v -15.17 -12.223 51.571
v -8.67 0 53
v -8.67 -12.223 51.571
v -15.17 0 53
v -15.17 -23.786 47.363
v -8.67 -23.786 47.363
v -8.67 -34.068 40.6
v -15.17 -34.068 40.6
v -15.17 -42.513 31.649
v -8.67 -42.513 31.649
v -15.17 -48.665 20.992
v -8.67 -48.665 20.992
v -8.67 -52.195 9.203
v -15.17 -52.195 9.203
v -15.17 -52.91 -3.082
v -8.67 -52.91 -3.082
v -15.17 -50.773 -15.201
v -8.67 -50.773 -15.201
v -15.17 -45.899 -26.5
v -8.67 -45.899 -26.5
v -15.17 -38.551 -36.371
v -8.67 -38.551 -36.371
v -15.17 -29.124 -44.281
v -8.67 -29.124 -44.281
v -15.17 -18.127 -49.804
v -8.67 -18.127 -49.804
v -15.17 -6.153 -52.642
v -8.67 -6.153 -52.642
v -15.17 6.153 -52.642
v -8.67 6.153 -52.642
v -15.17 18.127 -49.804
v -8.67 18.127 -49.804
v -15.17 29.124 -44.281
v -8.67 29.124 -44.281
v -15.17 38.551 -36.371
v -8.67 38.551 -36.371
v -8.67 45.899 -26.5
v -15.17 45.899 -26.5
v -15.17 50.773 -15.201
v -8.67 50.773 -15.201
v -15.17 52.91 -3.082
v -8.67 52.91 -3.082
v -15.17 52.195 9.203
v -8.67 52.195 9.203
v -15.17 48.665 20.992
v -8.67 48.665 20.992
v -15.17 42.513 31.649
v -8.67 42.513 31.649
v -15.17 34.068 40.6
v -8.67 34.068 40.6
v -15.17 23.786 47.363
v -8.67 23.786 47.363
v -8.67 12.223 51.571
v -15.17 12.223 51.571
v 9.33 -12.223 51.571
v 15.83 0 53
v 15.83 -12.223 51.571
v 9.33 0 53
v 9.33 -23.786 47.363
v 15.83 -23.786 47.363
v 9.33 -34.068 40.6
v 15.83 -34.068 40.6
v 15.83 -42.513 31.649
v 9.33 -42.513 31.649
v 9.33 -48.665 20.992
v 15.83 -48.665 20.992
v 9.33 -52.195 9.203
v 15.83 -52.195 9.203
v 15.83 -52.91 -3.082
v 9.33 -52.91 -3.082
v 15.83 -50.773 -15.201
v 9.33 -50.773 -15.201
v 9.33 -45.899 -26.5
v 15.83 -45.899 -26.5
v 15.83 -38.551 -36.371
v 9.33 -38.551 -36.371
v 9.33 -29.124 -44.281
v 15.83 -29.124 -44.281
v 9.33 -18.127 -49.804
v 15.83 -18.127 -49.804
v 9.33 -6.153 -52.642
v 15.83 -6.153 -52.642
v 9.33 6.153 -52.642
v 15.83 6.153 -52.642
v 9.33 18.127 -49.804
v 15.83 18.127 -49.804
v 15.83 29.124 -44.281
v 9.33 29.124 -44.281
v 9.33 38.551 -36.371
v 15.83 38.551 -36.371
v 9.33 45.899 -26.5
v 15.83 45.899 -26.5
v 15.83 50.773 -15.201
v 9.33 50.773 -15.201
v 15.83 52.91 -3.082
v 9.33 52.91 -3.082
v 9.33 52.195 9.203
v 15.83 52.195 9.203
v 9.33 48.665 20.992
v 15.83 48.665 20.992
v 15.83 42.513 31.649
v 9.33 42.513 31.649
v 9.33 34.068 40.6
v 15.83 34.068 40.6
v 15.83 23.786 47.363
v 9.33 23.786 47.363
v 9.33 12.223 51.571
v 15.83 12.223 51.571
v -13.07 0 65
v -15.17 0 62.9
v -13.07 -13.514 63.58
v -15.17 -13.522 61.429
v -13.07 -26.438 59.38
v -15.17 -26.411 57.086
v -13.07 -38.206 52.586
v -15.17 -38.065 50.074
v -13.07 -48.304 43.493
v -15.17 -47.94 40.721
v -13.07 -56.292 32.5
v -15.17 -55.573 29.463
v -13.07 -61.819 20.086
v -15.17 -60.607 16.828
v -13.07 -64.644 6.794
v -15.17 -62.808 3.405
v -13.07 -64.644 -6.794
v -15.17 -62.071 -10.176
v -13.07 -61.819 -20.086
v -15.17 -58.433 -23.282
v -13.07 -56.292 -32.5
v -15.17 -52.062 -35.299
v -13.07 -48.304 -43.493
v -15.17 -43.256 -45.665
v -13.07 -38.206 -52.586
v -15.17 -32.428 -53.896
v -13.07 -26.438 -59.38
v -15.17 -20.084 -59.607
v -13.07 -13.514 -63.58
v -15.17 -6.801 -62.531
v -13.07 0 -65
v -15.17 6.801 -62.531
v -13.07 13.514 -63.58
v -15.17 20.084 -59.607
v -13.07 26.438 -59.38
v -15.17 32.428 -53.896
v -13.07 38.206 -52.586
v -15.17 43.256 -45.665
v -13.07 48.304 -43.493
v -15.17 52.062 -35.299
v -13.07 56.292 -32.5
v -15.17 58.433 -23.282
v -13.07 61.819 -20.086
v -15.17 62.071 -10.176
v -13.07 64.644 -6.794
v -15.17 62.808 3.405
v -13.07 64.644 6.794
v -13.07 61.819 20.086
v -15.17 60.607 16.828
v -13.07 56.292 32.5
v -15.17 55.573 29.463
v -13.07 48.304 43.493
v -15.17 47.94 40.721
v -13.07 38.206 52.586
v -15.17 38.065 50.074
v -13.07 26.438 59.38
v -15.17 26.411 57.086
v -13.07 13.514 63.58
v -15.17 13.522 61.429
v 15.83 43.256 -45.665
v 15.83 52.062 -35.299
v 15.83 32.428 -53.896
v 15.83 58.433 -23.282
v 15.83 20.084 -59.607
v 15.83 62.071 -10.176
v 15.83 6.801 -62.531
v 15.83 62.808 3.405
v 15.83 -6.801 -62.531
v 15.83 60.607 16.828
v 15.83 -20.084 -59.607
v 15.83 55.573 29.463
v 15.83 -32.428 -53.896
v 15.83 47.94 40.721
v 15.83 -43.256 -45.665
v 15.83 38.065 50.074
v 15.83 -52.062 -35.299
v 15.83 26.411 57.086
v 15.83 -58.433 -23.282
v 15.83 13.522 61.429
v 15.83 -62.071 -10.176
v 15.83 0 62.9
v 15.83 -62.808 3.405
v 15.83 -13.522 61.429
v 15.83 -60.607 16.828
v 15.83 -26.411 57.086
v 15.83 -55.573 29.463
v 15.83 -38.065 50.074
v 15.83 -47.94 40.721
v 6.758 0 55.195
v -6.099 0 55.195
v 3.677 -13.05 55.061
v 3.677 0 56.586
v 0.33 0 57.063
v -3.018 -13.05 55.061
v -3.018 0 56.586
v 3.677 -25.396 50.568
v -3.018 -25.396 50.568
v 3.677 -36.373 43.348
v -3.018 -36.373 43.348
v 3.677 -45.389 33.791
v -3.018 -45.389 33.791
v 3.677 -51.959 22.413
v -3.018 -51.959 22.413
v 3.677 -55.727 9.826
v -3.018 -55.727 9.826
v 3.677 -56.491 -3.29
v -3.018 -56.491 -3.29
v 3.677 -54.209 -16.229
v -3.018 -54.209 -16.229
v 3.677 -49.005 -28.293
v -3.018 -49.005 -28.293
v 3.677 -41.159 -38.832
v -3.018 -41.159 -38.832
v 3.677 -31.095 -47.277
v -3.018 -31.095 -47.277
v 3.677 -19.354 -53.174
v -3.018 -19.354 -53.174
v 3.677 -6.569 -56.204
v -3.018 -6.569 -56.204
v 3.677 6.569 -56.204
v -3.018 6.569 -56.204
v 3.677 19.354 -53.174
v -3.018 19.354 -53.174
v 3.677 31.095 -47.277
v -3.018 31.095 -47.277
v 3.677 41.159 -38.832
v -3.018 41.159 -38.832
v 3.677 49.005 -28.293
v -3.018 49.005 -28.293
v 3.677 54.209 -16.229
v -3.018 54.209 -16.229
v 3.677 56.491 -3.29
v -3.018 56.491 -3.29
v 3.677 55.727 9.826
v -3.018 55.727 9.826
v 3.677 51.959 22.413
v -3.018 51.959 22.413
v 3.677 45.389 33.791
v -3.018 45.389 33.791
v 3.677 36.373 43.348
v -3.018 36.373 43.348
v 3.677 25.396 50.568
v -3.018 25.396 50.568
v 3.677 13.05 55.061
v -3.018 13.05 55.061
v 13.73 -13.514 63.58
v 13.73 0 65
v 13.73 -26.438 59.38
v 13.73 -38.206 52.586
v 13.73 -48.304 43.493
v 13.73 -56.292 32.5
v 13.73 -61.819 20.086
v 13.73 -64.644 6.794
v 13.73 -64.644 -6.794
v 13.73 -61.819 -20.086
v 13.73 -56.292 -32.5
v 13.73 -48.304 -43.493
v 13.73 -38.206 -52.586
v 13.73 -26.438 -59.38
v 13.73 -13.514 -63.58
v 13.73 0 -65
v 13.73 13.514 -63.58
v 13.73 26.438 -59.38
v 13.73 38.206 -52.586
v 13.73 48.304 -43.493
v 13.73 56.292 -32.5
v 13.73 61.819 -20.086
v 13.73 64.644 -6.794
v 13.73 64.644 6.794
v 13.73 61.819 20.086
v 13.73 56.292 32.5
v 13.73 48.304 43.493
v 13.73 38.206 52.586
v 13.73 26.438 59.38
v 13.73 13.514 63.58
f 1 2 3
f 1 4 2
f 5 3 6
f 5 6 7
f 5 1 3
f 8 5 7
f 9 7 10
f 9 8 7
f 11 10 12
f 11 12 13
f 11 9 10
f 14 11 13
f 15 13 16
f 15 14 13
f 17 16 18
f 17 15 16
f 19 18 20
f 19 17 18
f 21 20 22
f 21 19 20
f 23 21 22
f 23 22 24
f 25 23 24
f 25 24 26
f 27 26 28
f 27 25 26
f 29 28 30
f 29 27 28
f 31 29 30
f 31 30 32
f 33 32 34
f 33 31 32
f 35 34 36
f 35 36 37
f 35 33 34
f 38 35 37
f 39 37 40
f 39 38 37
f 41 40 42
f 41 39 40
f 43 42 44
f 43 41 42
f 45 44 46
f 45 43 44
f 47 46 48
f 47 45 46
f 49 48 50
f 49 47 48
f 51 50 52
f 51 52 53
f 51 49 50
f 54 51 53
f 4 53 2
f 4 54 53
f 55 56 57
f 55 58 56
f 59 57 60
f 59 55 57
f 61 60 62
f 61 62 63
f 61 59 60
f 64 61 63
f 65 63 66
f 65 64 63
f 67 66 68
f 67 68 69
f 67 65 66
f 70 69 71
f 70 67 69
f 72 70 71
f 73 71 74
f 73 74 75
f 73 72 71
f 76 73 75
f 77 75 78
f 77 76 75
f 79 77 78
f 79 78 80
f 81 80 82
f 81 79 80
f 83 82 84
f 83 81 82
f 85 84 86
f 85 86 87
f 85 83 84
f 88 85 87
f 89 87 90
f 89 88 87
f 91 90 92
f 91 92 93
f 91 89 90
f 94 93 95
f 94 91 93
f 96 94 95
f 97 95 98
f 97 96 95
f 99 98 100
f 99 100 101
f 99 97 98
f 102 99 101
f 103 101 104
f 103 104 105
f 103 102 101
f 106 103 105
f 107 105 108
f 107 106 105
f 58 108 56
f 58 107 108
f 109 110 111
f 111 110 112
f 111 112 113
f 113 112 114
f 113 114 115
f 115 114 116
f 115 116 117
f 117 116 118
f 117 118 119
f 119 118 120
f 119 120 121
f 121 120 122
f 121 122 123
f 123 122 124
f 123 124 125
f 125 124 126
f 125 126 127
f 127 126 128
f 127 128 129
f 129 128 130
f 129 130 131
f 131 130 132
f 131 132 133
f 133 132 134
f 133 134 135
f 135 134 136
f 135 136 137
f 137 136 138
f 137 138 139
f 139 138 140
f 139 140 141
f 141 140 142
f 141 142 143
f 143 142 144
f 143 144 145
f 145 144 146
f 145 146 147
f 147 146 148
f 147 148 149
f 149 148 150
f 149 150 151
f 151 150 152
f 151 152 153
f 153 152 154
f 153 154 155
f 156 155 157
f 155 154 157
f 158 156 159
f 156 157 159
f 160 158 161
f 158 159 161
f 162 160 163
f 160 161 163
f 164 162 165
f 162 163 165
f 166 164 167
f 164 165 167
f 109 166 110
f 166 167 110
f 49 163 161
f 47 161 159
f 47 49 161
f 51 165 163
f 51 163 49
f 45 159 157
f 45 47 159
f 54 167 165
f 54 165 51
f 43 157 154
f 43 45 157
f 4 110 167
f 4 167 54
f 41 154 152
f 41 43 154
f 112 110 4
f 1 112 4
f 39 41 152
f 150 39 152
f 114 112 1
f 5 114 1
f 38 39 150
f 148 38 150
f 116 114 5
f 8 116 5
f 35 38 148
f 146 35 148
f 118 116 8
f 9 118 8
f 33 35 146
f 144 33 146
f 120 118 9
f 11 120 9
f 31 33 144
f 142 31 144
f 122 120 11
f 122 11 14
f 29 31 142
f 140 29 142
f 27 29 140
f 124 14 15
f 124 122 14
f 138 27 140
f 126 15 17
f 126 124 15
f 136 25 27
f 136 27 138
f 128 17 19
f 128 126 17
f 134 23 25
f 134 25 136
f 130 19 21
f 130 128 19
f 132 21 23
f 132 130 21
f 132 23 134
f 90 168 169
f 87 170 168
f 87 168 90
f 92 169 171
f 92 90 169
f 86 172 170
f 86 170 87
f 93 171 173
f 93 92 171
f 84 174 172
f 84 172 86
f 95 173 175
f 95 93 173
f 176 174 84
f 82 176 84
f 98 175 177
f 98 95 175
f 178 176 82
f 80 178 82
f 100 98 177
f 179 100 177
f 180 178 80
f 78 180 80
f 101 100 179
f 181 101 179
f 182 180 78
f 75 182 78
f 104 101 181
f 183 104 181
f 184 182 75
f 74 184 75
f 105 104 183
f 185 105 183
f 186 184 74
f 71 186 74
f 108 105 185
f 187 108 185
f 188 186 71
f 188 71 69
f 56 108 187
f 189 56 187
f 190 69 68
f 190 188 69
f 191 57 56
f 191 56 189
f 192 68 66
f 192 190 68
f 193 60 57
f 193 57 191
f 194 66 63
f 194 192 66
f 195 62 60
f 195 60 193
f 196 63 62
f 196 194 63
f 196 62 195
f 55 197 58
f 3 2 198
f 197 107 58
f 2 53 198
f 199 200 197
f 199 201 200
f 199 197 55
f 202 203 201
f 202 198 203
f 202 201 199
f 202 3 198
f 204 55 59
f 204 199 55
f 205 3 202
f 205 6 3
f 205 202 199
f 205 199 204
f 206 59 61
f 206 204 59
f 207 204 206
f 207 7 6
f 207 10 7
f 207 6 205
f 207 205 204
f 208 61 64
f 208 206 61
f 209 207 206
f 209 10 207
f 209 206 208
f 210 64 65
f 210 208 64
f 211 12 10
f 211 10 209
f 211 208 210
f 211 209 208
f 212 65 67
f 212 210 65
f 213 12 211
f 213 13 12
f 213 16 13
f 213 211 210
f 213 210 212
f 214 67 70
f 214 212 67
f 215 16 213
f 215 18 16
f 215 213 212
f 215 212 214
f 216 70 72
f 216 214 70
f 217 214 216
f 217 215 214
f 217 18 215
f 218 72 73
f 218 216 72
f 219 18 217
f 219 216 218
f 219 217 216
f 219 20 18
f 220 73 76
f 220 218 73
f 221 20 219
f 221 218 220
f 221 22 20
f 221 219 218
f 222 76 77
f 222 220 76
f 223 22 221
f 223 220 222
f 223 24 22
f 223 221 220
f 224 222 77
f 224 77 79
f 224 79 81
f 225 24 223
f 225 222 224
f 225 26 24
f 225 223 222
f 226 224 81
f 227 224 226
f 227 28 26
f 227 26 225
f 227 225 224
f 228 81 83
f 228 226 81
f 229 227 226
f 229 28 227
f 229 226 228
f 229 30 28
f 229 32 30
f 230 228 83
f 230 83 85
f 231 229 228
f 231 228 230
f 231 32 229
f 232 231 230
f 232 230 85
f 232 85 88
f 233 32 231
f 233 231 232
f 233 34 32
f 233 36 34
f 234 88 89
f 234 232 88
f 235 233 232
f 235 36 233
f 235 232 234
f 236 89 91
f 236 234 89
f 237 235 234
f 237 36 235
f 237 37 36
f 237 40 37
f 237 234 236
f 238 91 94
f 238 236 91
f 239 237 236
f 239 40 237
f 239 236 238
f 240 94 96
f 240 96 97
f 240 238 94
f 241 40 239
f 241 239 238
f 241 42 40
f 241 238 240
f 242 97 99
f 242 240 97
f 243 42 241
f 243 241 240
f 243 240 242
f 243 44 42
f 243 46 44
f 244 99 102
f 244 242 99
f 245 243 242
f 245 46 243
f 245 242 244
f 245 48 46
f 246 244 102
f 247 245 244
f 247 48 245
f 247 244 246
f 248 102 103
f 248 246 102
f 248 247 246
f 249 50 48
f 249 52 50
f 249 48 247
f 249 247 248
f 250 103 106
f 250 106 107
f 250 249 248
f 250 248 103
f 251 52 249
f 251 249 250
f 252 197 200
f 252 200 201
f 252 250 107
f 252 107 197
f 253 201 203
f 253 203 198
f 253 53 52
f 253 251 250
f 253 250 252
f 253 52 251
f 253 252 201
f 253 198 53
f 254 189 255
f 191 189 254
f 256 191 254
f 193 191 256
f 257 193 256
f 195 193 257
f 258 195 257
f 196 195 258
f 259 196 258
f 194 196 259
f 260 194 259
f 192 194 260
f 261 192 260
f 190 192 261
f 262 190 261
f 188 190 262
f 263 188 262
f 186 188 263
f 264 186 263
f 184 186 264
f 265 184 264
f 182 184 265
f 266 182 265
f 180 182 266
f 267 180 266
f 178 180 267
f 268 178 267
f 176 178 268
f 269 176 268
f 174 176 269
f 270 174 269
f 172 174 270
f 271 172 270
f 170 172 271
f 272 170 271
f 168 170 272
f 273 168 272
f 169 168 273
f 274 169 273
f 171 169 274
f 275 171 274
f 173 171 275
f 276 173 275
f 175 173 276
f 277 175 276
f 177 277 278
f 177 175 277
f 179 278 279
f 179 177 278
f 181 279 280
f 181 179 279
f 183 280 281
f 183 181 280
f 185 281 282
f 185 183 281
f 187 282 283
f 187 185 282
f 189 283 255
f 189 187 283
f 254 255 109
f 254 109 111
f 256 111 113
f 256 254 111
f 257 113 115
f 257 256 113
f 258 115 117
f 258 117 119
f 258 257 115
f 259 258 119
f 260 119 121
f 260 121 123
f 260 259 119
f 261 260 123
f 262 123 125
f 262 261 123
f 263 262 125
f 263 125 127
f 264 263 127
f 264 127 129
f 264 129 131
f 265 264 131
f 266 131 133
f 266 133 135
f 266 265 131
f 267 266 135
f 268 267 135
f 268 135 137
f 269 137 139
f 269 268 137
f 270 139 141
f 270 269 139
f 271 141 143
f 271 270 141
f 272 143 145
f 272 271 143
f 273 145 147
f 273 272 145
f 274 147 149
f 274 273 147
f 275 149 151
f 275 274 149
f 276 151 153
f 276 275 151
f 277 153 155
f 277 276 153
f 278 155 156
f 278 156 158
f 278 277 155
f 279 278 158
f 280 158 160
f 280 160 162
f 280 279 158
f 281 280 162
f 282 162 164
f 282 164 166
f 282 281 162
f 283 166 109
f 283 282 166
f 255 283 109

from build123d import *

# Parameters (mm, degrees)
CHAMFER1_SIZE = 2.1


with BuildPart() as part:
    # Sketch1 → Revolve1 (revolve)
    with BuildSketch(Plane.XY, mode=Mode.PRIVATE) as revolve1_sk:
        with BuildLine():
            Line((-15.170481252, 65), (15.829518748, 65))
            Line((15.829518748, 65), (15.829518748, 53))
            Line((15.829518748, 53), (9.329518748, 53))
            ThreePointArc((9.329518748, 53), (0.329518748, 57.062746067), (-8.670481252, 53))
            Line((-8.670481252, 53), (-15.170481252, 53))
            Line((-15.170481252, 53), (-15.170481252, 65))
        make_face()
    revolve(revolve1_sk.sketch.rotate(Axis((-8.519406172, 0, 0), (1, 0, 0)), 90), axis=Axis((-8.519406172, 0, 0), (1, 0, 0)))

    # Chamfer1
    chamfer1_edges = [part.edges().sort_by_distance(p)[0] for p in [
        (15.829518748, 0, -65),
        (-15.170481252, 0, -65),
    ]]
    chamfer(chamfer1_edges, length=CHAMFER1_SIZE)


solid = part.part
